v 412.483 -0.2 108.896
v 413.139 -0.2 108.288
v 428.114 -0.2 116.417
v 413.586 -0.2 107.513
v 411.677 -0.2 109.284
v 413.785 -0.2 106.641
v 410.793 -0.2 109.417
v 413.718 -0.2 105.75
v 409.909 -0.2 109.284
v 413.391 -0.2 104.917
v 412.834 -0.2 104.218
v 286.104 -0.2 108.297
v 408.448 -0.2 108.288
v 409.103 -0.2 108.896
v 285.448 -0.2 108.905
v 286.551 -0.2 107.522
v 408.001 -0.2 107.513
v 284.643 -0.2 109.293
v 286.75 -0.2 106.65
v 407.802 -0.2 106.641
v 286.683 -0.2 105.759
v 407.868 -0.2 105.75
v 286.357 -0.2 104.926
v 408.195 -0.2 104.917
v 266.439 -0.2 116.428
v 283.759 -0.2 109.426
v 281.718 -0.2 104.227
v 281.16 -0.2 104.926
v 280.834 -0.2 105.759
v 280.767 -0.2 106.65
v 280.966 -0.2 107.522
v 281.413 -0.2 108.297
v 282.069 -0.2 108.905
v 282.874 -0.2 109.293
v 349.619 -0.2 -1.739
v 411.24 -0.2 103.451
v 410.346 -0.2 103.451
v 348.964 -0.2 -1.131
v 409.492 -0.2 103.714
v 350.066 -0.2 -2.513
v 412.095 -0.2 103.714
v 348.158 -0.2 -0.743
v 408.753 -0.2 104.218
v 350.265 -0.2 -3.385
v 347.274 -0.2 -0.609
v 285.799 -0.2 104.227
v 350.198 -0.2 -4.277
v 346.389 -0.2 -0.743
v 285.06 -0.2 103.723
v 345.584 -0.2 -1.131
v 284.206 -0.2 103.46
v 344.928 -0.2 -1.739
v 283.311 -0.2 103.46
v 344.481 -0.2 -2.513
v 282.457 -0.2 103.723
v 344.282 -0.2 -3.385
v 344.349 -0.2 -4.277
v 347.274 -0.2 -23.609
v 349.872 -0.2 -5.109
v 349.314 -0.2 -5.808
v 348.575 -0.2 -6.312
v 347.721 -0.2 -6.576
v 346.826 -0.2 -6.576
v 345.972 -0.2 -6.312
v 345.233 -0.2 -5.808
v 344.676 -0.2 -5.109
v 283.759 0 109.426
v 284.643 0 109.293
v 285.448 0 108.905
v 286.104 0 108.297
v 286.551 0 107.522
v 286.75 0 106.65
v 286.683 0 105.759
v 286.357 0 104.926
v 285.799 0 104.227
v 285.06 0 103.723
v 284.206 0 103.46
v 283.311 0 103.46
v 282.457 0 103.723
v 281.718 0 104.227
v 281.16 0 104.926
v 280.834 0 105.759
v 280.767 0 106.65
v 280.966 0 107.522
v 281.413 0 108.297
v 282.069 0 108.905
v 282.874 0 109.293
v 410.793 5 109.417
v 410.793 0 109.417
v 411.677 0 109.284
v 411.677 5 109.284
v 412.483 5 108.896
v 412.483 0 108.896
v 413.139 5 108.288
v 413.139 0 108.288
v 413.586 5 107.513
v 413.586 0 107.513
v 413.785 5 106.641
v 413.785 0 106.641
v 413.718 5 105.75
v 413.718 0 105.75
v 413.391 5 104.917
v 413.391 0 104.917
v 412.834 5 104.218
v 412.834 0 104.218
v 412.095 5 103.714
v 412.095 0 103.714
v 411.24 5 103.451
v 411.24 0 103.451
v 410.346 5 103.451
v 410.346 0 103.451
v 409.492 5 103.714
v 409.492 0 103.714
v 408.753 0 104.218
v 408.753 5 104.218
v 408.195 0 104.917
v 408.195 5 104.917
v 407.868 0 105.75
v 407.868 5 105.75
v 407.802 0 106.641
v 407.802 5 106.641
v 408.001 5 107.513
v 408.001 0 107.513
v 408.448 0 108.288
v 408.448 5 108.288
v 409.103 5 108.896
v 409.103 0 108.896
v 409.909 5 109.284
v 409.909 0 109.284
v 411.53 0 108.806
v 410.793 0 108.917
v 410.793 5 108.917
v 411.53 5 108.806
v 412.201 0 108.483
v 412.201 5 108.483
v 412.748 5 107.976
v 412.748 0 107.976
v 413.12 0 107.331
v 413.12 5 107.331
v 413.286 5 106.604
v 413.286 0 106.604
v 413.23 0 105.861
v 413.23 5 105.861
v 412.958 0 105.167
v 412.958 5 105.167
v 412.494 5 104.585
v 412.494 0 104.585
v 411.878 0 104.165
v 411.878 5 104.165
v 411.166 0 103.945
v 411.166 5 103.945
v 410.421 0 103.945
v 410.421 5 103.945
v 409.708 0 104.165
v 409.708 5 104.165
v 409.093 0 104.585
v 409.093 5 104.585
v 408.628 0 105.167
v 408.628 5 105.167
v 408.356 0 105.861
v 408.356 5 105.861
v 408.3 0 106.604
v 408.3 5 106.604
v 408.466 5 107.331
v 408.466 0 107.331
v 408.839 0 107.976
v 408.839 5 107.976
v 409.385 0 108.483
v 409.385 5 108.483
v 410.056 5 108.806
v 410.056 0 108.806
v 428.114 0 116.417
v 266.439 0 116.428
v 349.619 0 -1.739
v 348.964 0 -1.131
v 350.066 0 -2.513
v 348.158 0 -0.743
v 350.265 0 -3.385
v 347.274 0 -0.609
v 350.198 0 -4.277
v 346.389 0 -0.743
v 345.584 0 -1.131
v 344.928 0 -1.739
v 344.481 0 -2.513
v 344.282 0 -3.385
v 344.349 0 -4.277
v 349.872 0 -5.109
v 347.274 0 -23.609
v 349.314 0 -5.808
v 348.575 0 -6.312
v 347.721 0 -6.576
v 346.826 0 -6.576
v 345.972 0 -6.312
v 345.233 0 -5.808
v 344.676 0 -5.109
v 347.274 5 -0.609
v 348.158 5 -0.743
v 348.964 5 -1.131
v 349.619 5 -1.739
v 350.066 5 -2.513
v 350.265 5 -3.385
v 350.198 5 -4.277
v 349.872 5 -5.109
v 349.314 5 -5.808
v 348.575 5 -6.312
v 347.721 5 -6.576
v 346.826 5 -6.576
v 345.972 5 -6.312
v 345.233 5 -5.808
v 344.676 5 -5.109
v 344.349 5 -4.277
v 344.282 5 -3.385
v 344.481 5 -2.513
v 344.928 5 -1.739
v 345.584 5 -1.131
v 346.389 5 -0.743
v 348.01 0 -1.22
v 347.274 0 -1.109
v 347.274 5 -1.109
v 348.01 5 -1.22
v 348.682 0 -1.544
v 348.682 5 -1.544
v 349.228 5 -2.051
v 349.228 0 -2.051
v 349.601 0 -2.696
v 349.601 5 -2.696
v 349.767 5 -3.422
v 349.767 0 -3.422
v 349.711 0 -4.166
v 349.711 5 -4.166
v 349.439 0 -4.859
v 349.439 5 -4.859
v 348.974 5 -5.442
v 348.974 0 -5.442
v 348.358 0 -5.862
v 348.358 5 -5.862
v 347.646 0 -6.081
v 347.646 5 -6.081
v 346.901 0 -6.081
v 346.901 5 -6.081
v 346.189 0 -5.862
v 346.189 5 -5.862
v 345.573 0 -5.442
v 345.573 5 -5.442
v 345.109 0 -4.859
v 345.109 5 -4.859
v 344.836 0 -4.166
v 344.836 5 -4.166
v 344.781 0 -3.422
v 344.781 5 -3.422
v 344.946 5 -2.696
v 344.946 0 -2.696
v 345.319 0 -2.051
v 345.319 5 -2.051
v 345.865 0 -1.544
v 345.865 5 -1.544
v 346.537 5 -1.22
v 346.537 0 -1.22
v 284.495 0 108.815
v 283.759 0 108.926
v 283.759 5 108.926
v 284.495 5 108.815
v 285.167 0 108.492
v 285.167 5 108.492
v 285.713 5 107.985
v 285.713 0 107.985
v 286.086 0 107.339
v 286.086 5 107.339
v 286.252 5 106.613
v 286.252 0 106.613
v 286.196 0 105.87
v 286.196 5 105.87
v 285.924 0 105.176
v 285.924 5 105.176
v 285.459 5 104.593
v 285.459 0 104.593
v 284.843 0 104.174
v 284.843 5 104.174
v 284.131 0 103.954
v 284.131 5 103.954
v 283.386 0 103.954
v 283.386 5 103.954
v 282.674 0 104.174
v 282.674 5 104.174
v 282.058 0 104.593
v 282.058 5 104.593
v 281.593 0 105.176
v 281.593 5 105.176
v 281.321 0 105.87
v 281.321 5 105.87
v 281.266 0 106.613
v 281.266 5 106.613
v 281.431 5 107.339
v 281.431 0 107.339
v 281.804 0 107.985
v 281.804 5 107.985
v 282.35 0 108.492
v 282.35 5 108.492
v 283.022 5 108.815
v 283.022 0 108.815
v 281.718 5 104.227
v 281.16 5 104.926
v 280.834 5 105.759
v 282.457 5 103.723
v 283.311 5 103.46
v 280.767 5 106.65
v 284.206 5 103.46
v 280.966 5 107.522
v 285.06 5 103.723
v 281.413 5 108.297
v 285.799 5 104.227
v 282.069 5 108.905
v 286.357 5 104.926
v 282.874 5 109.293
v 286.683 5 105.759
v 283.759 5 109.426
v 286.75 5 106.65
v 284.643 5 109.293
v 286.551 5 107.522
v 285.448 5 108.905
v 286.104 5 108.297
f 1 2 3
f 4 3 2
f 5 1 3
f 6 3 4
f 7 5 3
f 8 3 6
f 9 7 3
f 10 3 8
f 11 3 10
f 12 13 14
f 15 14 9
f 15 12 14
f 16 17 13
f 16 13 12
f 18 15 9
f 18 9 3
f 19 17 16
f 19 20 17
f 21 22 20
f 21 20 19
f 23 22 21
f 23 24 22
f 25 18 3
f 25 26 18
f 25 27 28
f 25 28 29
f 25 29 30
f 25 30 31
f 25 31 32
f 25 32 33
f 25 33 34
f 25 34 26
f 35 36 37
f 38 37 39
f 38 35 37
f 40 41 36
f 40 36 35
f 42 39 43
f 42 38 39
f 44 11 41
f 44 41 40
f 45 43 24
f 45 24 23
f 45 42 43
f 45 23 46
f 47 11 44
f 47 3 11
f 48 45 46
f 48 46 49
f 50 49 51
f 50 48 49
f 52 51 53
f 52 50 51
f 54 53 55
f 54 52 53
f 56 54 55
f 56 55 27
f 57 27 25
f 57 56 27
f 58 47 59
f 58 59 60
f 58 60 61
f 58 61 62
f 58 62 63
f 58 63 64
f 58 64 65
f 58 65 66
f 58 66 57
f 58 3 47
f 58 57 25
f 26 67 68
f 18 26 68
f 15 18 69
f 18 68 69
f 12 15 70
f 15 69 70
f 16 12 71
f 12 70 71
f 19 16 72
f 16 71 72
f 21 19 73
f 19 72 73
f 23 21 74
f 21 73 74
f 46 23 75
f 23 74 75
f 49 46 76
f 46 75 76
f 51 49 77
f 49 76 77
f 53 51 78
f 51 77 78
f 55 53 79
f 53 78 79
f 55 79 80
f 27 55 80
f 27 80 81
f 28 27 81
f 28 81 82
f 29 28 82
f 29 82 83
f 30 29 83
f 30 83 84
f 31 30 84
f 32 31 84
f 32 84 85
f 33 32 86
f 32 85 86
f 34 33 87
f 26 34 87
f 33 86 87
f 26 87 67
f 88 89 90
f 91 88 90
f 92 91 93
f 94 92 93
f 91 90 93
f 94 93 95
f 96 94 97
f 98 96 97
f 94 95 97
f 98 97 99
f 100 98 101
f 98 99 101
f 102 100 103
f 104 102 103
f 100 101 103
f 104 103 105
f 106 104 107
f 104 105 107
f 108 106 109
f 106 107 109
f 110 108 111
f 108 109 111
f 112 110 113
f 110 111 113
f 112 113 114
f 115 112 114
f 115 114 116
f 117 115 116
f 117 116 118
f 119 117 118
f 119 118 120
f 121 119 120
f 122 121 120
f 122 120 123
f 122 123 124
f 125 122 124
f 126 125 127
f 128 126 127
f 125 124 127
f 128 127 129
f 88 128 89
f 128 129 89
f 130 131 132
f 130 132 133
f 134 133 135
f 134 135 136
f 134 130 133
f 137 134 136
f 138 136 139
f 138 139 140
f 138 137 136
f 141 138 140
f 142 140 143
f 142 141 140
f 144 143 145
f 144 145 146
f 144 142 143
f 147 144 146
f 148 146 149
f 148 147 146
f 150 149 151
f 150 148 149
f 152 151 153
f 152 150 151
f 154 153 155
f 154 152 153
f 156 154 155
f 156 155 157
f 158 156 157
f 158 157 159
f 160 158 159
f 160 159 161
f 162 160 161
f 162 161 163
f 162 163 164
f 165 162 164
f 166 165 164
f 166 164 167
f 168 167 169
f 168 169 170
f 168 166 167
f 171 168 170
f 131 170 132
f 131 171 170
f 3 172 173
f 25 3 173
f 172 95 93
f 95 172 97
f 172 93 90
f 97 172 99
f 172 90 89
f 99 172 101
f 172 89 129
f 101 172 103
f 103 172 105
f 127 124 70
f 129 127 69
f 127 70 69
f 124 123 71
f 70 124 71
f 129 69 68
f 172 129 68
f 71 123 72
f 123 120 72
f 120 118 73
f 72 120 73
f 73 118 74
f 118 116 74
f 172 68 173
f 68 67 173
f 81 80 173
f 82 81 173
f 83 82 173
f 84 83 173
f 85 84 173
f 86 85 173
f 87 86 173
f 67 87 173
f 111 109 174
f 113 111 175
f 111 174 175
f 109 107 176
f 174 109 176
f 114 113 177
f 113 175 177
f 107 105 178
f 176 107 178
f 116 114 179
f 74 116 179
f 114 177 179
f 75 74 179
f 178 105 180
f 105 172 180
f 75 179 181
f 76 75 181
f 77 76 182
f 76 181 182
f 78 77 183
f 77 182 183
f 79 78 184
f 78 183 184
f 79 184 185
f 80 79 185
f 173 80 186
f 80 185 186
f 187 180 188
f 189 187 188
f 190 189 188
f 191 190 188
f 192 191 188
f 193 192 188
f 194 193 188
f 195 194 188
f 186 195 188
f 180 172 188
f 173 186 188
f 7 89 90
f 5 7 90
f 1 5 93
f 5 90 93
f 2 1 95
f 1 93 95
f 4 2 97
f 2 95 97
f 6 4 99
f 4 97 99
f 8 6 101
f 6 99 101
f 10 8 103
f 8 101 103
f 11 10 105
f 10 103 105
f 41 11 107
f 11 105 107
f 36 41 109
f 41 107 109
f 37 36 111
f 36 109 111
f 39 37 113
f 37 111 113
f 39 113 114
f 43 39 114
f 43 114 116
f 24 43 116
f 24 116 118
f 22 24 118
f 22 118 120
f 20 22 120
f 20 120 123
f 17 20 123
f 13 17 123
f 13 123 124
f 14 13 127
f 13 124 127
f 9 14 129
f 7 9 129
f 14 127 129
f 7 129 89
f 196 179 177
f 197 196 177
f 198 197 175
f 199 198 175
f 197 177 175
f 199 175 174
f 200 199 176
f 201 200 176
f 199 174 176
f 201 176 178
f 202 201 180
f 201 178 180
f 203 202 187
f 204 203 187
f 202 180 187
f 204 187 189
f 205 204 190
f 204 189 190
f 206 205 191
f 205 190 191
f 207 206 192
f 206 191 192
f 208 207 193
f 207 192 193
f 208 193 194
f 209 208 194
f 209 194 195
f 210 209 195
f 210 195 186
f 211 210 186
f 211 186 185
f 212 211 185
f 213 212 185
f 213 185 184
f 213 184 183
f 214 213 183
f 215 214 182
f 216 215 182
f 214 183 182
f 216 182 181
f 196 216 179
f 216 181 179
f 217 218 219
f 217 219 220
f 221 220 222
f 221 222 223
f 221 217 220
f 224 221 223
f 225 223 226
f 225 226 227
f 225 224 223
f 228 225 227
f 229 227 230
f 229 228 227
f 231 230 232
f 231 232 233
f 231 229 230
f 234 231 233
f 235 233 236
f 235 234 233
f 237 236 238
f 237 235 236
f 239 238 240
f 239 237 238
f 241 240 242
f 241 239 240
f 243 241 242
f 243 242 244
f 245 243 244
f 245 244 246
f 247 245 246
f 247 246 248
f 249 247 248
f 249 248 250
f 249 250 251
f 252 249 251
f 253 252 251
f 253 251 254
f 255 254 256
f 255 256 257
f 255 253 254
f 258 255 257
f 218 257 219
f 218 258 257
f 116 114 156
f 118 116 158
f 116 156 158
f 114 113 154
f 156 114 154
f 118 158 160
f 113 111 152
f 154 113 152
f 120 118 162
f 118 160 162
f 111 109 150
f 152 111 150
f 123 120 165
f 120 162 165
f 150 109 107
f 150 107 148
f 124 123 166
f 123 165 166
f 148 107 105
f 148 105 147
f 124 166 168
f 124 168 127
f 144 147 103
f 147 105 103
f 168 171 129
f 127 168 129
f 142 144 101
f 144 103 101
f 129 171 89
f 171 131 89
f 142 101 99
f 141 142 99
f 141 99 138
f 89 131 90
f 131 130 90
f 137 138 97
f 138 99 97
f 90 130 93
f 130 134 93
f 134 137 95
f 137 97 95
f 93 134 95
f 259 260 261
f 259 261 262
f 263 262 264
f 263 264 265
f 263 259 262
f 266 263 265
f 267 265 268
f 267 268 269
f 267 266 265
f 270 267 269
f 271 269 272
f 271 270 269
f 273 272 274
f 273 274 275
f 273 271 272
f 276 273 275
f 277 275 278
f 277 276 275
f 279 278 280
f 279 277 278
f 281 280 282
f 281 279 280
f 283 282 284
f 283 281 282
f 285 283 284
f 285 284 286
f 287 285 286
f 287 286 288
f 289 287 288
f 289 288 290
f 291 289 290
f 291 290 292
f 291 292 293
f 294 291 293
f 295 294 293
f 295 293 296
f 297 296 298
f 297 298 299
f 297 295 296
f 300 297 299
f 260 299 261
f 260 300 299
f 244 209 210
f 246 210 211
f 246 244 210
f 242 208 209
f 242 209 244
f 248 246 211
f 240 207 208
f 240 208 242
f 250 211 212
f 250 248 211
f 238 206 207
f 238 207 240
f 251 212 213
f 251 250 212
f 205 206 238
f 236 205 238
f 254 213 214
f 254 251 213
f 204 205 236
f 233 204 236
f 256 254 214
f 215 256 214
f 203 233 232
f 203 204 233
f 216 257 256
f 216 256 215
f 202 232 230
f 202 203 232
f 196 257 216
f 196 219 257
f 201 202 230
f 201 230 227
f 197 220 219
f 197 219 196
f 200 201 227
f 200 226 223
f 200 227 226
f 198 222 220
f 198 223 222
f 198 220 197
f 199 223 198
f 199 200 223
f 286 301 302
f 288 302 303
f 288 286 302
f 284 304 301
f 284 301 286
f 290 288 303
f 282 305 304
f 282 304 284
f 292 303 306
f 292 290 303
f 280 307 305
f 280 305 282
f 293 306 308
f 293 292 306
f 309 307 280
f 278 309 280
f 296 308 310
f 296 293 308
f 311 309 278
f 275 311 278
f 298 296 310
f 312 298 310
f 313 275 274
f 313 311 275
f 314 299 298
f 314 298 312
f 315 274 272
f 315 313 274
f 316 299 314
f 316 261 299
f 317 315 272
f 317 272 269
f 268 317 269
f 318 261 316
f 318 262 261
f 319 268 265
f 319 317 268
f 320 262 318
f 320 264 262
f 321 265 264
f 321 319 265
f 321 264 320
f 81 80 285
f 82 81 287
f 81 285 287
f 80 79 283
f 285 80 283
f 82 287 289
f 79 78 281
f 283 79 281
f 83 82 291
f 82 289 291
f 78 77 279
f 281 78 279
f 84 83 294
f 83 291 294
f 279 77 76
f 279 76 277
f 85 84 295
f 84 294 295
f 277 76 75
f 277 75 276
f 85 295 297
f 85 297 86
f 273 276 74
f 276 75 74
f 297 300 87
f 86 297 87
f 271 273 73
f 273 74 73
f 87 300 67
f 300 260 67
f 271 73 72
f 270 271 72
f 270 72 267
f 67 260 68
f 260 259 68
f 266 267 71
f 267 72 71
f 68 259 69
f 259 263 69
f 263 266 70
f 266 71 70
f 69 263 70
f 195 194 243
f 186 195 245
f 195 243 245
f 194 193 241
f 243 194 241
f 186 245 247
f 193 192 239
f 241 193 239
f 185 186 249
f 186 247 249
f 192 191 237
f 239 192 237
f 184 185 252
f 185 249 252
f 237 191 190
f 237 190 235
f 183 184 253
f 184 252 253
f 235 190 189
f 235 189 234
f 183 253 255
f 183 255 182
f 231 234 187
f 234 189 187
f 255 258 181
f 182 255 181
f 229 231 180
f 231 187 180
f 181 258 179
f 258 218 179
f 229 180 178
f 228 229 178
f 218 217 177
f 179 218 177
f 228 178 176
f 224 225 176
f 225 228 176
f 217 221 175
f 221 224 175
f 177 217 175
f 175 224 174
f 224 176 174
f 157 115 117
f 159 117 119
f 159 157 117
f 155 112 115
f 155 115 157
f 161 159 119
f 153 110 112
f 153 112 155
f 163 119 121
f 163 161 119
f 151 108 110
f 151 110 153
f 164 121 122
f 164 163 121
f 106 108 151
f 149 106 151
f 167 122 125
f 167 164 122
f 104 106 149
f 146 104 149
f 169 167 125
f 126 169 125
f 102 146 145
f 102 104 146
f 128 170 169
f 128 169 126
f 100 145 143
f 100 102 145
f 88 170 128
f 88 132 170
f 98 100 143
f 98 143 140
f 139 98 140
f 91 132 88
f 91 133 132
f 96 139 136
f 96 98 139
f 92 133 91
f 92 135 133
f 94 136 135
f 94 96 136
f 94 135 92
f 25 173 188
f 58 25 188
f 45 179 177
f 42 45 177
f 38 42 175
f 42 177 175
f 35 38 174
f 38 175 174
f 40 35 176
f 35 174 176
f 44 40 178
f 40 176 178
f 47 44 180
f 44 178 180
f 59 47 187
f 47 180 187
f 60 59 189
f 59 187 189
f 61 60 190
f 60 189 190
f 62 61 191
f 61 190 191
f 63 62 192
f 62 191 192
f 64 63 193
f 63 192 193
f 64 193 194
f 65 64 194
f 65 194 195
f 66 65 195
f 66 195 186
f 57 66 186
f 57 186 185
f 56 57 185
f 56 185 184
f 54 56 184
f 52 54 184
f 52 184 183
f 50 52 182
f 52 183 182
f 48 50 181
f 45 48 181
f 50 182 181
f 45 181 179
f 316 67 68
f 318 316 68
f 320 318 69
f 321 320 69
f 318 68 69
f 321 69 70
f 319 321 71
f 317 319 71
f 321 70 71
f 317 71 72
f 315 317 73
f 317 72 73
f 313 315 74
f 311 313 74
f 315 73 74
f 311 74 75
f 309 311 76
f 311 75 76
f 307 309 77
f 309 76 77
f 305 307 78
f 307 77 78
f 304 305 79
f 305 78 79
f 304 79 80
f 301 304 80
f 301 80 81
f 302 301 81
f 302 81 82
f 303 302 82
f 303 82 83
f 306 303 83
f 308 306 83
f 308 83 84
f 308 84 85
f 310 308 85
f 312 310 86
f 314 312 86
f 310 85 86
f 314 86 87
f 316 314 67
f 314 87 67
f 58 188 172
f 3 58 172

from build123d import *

# Parameters (mm, degrees)
SKETCH1_R             = 3
BOSS_EXTRUDE5_DEPTH   = 0.2
SKETCH1_21_R          = 3
SKETCH1_21_R_2        = 2.5
BOSS_EXTRUDE6_DEPTH   = 5
BOSS_EXTRUDE6_2_DEPTH = 5
BOSS_EXTRUDE6_3_DEPTH = 5


with BuildPart() as part:
    # Sketch1 → Boss-Extrude5 (new body)
    with BuildSketch(Plane(origin=(0, 0, 0), x_dir=(1, 0, 0), z_dir=(0, 1, 0))):
        Polygon((347.273609729, 23.609230825), (266.439108268, -116.428009241), (428.113670918, -116.417164681), align=None)
        with Locations((283.758521159, -106.426112565)):
            Circle(SKETCH1_R, mode=Mode.SUBTRACT)
        with Locations((410.793152563, -106.417182487)):
            Circle(SKETCH1_R, mode=Mode.SUBTRACT)
        with Locations((347.273609729, 3.609230825)):
            Circle(SKETCH1_R, mode=Mode.SUBTRACT)
    extrude(amount=-BOSS_EXTRUDE5_DEPTH)


with BuildPart() as body_2:
    # Sketch1<21> → Boss-Extrude6 (new body)
    with BuildSketch(Plane(origin=(0, 0, 0), x_dir=(1, 0, 0), z_dir=(0, 1, 0))):
        with Locations((347.273609729, 3.609230825)):
            Circle(SKETCH1_21_R)
        with Locations((347.273609729, 3.609230825)):
            Circle(SKETCH1_21_R_2, mode=Mode.SUBTRACT)
    extrude(amount=BOSS_EXTRUDE6_DEPTH)


with BuildPart() as body_3:
    # Sketch1<21> → Boss-Extrude6 2 (new body)
    with BuildSketch(Plane(origin=(0, 0, 0), x_dir=(1, 0, 0), z_dir=(0, 1, 0))):
        with Locations((410.793152563, -106.417182487)):
            Circle(SKETCH1_21_R)
        with Locations((410.793152563, -106.417182487)):
            Circle(SKETCH1_21_R_2, mode=Mode.SUBTRACT)
    extrude(amount=BOSS_EXTRUDE6_2_DEPTH)


with BuildPart() as body_4:
    # Sketch1<21> → Boss-Extrude6 3 (new body)
    with BuildSketch(Plane(origin=(0, 0, 0), x_dir=(1, 0, 0), z_dir=(0, 1, 0))):
        with Locations((283.758521159, -106.426112565)):
            Circle(SKETCH1_21_R)
        with Locations((283.758521159, -106.426112565)):
            Circle(SKETCH1_21_R_2, mode=Mode.SUBTRACT)
    extrude(amount=BOSS_EXTRUDE6_3_DEPTH)


solid = Compound([part.part, body_2.part, body_3.part, body_4.part])
